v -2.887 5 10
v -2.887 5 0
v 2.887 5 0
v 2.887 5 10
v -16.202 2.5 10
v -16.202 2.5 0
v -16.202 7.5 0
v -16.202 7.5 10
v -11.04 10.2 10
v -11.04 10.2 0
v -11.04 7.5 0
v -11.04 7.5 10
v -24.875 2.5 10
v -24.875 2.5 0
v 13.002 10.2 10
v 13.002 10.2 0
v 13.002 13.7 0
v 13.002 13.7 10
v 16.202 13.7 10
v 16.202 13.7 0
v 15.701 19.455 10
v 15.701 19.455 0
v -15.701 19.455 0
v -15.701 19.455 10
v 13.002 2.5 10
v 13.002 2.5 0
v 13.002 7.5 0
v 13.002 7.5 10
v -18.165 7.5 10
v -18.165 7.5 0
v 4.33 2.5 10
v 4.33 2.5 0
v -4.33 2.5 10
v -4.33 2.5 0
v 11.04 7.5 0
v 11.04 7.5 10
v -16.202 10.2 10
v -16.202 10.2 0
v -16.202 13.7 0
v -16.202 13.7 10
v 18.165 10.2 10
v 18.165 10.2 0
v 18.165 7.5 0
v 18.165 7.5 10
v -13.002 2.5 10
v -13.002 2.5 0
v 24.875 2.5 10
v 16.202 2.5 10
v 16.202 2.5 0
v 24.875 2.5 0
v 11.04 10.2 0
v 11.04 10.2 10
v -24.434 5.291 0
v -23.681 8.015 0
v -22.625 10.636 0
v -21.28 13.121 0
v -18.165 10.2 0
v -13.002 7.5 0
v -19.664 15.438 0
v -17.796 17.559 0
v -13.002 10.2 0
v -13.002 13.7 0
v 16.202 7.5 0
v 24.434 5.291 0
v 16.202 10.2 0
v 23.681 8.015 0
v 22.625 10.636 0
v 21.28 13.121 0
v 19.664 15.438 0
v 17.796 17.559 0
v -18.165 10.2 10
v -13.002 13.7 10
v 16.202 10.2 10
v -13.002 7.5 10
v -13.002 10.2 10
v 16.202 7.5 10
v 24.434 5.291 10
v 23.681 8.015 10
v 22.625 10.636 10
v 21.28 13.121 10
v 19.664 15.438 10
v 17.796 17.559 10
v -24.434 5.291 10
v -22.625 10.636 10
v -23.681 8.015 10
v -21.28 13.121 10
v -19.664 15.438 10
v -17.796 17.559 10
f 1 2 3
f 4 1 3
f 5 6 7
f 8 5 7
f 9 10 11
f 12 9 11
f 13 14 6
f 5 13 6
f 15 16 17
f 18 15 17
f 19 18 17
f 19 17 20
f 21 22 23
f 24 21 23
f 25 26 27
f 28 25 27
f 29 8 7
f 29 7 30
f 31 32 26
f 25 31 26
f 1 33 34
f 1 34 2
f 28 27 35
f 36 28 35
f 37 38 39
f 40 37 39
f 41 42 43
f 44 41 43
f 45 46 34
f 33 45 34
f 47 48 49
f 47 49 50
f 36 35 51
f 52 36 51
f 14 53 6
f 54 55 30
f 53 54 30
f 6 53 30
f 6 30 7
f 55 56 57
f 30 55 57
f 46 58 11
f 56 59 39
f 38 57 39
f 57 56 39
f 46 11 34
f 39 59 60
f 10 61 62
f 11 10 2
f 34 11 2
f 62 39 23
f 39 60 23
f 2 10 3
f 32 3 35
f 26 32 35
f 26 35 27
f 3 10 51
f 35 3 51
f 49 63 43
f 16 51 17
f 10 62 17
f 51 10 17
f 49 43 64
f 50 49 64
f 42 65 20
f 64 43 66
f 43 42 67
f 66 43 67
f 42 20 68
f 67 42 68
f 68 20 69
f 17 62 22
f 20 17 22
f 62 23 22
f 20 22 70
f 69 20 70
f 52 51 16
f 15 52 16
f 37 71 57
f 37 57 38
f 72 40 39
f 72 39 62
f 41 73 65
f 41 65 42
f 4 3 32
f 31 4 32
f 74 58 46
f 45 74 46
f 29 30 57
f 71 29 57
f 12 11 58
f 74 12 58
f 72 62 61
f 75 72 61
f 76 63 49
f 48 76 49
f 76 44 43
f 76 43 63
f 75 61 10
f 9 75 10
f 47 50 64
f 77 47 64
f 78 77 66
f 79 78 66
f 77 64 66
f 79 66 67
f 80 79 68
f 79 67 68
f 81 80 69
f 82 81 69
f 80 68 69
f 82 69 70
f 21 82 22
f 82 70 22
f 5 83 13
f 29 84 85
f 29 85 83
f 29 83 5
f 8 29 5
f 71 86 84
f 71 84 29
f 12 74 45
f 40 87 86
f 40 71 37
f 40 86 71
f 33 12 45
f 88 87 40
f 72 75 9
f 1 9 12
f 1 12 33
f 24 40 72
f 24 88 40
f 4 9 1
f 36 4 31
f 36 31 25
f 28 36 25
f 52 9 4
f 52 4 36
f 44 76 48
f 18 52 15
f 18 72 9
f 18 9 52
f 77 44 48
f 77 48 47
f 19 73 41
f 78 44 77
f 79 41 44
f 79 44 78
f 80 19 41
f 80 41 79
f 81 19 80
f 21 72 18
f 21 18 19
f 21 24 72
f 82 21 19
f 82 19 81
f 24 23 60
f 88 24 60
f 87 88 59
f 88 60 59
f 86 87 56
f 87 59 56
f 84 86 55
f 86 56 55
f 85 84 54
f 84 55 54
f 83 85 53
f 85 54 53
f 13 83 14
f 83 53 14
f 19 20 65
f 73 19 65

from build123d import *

# Parameters (mm, degrees)
BOSS_EXTRUDE2_DEPTH = 10


with BuildPart() as part:
    # Sketch2 → Boss-Extrude2 (new body)
    with BuildSketch(Plane.XY):
        with BuildLine():
            Line((0, 19.454800467), (0, 5))
            Line((0, 5), (2.886751346, 5))
            Line((2.886751346, 5), (4.330127019, 2.5))
            Line((4.330127019, 2.5), (13.002406473, 2.5))
            Line((13.002406473, 2.5), (13.002406473, 7.5))
            Line((13.002406473, 7.5), (11.039564591, 7.5))
            Line((11.039564591, 7.5), (11.039564591, 10.2))
            Line((11.039564591, 10.2), (13.002406473, 10.2))
            Line((13.002406473, 10.2), (13.002406473, 13.7))
            Line((13.002406473, 13.7), (16.202406473, 13.7))
            Line((16.202406473, 13.7), (16.202406473, 10.2))
            Line((16.202406473, 10.2), (18.165248356, 10.2))
            Line((18.165248356, 10.2), (18.165248356, 7.5))
            Line((18.165248356, 7.5), (16.202406473, 7.5))
            Line((16.202406473, 7.5), (16.202406473, 2.5))
            Line((16.202406473, 2.5), (24.874685928, 2.5))
            ThreePointArc((24.874685928, 2.5), (21.987632849, 11.89722664), (15.700660457, 19.454800467))
            Line((15.700660457, 19.454800467), (0, 19.454800467))
        make_face()
        with BuildLine():
            Line((-13.002406473, 2.5), (-4.330127019, 2.5))
            Line((-4.330127019, 2.5), (-2.886751346, 5))
            Line((-2.886751346, 5), (0, 5))
            Line((0, 5), (0, 19.454800467))
            Line((0, 19.454800467), (-15.700660457, 19.454800467))
            ThreePointArc((-15.700660457, 19.454800467), (-21.987632849, 11.89722664), (-24.874685928, 2.5))
            Line((-24.874685928, 2.5), (-16.202406473, 2.5))
            Line((-16.202406473, 2.5), (-16.202406473, 7.5))
            Line((-16.202406473, 7.5), (-18.165248356, 7.5))
            Line((-18.165248356, 7.5), (-18.165248356, 10.2))
            Line((-18.165248356, 10.2), (-16.202406473, 10.2))
            Line((-16.202406473, 10.2), (-16.202406473, 13.7))
            Line((-16.202406473, 13.7), (-13.002406473, 13.7))
            Line((-13.002406473, 13.7), (-13.002406473, 10.2))
            Line((-13.002406473, 10.2), (-11.039564591, 10.2))
            Line((-11.039564591, 10.2), (-11.039564591, 7.5))
            Line((-11.039564591, 7.5), (-13.002406473, 7.5))
            Line((-13.002406473, 7.5), (-13.002406473, 2.5))
        make_face()
    extrude(amount=BOSS_EXTRUDE2_DEPTH)


solid = part.part
